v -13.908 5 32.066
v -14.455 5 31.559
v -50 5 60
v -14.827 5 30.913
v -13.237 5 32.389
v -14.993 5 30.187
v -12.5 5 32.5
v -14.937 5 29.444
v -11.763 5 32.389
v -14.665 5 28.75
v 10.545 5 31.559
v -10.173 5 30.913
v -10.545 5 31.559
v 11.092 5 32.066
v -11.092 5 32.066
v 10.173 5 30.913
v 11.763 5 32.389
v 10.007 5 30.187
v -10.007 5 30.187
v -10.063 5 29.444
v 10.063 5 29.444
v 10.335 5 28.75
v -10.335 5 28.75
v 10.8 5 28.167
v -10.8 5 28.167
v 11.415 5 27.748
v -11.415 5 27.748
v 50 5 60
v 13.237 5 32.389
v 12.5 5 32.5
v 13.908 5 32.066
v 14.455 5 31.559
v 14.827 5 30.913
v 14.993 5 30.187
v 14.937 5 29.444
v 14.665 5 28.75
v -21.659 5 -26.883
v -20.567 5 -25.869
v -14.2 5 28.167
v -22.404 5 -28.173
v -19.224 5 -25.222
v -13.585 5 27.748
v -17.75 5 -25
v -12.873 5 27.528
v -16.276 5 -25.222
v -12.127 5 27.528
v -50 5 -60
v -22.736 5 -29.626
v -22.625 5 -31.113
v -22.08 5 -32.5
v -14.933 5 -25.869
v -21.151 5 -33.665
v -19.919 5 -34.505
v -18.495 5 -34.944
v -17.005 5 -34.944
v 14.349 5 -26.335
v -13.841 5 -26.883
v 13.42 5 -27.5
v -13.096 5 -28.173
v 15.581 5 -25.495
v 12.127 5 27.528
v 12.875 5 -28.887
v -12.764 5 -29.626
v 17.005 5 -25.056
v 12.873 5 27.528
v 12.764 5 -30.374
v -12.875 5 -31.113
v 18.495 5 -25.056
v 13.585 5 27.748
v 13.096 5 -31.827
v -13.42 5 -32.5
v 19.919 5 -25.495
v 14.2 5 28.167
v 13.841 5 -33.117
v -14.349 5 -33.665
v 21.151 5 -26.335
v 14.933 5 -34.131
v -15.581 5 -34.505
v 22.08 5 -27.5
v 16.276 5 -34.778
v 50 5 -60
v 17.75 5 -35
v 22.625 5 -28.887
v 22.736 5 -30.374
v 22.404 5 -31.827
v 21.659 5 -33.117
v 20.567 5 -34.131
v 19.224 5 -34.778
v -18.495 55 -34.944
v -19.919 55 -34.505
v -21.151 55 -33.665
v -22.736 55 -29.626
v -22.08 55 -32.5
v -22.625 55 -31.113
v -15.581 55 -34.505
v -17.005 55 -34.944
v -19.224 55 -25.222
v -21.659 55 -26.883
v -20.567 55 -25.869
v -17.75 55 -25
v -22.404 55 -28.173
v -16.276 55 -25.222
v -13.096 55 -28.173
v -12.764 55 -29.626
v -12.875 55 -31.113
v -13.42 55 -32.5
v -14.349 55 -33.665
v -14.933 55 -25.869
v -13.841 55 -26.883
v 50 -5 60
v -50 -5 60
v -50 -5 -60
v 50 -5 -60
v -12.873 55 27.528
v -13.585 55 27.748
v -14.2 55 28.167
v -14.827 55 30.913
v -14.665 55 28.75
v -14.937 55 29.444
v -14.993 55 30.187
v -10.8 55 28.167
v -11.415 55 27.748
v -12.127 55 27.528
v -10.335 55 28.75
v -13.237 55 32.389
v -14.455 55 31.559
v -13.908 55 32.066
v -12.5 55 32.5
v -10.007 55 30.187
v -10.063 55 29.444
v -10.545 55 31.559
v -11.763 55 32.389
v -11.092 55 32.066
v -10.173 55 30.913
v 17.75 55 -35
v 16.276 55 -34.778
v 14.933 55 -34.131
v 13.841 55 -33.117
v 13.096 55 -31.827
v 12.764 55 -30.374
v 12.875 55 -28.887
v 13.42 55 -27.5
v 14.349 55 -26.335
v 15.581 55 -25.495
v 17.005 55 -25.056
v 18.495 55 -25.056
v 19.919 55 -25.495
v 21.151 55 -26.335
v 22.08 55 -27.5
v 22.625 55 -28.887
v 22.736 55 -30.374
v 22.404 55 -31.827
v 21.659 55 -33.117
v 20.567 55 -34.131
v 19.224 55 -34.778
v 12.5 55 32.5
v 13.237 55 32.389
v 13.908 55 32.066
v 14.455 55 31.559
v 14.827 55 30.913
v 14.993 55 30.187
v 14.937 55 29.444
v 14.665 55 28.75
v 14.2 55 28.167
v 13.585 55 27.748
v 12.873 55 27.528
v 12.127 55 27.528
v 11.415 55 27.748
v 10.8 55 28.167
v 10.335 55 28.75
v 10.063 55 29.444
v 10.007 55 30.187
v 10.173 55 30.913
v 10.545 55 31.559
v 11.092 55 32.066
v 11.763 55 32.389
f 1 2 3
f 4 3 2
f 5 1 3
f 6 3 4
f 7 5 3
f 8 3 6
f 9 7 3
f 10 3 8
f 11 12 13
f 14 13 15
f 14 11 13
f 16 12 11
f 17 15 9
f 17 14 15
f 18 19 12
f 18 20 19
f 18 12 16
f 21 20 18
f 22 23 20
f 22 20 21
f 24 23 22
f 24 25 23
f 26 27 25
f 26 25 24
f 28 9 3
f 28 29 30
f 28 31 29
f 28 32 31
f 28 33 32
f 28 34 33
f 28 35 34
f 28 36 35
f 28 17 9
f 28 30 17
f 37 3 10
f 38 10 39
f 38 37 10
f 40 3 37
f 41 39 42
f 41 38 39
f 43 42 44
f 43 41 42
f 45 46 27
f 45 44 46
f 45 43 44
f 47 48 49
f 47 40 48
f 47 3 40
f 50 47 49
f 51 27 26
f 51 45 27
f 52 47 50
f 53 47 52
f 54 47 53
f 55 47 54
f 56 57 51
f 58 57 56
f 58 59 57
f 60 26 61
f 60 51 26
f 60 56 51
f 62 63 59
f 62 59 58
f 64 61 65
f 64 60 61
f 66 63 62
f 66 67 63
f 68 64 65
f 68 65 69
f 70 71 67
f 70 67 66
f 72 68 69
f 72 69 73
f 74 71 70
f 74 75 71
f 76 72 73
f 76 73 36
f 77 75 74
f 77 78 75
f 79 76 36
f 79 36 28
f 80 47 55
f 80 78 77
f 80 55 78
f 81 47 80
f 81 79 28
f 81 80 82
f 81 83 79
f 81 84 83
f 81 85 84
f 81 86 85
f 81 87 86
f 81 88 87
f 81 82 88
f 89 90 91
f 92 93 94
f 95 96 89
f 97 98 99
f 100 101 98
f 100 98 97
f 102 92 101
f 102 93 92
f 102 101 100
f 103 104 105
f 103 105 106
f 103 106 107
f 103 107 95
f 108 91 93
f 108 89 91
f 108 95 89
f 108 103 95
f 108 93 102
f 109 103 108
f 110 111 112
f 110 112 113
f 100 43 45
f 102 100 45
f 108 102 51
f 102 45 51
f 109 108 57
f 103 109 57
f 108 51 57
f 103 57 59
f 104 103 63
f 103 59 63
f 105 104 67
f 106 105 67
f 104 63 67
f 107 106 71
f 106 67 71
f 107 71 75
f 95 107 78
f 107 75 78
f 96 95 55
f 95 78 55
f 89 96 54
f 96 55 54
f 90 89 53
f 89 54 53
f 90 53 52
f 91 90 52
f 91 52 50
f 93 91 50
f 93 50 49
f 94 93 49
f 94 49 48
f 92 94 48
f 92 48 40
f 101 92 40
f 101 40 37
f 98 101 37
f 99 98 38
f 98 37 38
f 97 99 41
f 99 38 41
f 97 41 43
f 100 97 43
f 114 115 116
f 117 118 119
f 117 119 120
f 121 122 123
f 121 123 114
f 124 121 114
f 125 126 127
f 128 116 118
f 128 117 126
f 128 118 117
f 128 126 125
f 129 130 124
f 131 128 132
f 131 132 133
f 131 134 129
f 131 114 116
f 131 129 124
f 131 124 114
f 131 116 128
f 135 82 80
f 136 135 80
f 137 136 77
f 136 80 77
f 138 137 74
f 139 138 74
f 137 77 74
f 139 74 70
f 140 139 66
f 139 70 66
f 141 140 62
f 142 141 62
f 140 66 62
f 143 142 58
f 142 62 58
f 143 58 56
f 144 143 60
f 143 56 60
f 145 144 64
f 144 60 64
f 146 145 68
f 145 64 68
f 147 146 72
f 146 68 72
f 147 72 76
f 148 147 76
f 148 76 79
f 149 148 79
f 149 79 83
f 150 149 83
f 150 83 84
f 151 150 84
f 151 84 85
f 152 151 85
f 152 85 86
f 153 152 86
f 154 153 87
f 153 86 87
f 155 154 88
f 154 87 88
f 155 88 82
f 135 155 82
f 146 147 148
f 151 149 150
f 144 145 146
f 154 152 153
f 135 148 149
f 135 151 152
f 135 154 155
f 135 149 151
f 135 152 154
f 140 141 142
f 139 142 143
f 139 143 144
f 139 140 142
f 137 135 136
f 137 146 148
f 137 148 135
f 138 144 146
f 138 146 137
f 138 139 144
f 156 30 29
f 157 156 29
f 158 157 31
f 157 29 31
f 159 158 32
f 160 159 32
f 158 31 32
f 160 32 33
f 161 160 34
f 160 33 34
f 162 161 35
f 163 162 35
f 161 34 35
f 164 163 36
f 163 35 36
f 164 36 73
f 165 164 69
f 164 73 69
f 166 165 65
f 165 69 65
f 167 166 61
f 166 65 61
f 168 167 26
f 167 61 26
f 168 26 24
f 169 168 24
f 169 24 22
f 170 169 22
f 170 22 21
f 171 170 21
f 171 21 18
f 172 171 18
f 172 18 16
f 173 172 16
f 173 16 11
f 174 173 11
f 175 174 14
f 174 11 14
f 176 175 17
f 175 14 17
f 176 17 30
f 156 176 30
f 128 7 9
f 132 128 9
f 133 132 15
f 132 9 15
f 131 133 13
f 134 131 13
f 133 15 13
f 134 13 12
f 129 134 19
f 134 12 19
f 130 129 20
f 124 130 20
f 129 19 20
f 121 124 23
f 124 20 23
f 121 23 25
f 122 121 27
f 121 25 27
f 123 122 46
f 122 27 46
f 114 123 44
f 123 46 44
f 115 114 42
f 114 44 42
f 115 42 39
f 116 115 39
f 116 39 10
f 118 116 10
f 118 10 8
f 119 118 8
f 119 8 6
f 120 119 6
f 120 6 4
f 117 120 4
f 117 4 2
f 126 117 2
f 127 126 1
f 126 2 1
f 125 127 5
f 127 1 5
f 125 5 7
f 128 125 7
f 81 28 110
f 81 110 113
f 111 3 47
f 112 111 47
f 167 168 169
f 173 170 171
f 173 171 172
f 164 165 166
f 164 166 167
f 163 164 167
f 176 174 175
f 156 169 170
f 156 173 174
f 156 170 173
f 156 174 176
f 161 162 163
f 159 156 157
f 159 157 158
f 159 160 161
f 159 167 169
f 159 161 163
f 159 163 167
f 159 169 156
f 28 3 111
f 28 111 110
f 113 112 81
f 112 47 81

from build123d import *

# Parameters (mm, degrees)
SKETCH1_W           = 100
SKETCH1_H           = 120
BOSS_EXTRUDE1_DEPTH = 5
SKETCH2_R           = 5
SKETCH2_R_2         = 2.5
BOSS_EXTRUDE2_DEPTH = 50


with BuildPart() as part:
    # Sketch1 → Boss-Extrude1 (new, symmetric)
    with BuildSketch(Plane(origin=(0, 0, 0), x_dir=(1, 0, 0), z_dir=(0, 1, 0))):
        Rectangle(SKETCH1_W, SKETCH1_H)
    extrude(amount=BOSS_EXTRUDE1_DEPTH, both=True)

    # Sketch2 → Boss-Extrude2 (add)
    with BuildSketch(Plane(origin=(0, 5, 0), x_dir=(1, 0, 0), z_dir=(0, 1, 0))):
        with Locations(Location((-17.75, 30, 0), (0, 0, 270))):
            Circle(SKETCH2_R)
        with Locations(Location((17.75, 30, 0), (0, 0, 90))):
            Circle(SKETCH2_R)
        with Locations(Location((-12.5, -30, 0), (0, 0, 270))):
            Circle(SKETCH2_R_2)
        with Locations(Location((12.5, -30, 0), (0, 0, 270))):
            Circle(SKETCH2_R_2)
    extrude(amount=BOSS_EXTRUDE2_DEPTH)


solid = part.part
